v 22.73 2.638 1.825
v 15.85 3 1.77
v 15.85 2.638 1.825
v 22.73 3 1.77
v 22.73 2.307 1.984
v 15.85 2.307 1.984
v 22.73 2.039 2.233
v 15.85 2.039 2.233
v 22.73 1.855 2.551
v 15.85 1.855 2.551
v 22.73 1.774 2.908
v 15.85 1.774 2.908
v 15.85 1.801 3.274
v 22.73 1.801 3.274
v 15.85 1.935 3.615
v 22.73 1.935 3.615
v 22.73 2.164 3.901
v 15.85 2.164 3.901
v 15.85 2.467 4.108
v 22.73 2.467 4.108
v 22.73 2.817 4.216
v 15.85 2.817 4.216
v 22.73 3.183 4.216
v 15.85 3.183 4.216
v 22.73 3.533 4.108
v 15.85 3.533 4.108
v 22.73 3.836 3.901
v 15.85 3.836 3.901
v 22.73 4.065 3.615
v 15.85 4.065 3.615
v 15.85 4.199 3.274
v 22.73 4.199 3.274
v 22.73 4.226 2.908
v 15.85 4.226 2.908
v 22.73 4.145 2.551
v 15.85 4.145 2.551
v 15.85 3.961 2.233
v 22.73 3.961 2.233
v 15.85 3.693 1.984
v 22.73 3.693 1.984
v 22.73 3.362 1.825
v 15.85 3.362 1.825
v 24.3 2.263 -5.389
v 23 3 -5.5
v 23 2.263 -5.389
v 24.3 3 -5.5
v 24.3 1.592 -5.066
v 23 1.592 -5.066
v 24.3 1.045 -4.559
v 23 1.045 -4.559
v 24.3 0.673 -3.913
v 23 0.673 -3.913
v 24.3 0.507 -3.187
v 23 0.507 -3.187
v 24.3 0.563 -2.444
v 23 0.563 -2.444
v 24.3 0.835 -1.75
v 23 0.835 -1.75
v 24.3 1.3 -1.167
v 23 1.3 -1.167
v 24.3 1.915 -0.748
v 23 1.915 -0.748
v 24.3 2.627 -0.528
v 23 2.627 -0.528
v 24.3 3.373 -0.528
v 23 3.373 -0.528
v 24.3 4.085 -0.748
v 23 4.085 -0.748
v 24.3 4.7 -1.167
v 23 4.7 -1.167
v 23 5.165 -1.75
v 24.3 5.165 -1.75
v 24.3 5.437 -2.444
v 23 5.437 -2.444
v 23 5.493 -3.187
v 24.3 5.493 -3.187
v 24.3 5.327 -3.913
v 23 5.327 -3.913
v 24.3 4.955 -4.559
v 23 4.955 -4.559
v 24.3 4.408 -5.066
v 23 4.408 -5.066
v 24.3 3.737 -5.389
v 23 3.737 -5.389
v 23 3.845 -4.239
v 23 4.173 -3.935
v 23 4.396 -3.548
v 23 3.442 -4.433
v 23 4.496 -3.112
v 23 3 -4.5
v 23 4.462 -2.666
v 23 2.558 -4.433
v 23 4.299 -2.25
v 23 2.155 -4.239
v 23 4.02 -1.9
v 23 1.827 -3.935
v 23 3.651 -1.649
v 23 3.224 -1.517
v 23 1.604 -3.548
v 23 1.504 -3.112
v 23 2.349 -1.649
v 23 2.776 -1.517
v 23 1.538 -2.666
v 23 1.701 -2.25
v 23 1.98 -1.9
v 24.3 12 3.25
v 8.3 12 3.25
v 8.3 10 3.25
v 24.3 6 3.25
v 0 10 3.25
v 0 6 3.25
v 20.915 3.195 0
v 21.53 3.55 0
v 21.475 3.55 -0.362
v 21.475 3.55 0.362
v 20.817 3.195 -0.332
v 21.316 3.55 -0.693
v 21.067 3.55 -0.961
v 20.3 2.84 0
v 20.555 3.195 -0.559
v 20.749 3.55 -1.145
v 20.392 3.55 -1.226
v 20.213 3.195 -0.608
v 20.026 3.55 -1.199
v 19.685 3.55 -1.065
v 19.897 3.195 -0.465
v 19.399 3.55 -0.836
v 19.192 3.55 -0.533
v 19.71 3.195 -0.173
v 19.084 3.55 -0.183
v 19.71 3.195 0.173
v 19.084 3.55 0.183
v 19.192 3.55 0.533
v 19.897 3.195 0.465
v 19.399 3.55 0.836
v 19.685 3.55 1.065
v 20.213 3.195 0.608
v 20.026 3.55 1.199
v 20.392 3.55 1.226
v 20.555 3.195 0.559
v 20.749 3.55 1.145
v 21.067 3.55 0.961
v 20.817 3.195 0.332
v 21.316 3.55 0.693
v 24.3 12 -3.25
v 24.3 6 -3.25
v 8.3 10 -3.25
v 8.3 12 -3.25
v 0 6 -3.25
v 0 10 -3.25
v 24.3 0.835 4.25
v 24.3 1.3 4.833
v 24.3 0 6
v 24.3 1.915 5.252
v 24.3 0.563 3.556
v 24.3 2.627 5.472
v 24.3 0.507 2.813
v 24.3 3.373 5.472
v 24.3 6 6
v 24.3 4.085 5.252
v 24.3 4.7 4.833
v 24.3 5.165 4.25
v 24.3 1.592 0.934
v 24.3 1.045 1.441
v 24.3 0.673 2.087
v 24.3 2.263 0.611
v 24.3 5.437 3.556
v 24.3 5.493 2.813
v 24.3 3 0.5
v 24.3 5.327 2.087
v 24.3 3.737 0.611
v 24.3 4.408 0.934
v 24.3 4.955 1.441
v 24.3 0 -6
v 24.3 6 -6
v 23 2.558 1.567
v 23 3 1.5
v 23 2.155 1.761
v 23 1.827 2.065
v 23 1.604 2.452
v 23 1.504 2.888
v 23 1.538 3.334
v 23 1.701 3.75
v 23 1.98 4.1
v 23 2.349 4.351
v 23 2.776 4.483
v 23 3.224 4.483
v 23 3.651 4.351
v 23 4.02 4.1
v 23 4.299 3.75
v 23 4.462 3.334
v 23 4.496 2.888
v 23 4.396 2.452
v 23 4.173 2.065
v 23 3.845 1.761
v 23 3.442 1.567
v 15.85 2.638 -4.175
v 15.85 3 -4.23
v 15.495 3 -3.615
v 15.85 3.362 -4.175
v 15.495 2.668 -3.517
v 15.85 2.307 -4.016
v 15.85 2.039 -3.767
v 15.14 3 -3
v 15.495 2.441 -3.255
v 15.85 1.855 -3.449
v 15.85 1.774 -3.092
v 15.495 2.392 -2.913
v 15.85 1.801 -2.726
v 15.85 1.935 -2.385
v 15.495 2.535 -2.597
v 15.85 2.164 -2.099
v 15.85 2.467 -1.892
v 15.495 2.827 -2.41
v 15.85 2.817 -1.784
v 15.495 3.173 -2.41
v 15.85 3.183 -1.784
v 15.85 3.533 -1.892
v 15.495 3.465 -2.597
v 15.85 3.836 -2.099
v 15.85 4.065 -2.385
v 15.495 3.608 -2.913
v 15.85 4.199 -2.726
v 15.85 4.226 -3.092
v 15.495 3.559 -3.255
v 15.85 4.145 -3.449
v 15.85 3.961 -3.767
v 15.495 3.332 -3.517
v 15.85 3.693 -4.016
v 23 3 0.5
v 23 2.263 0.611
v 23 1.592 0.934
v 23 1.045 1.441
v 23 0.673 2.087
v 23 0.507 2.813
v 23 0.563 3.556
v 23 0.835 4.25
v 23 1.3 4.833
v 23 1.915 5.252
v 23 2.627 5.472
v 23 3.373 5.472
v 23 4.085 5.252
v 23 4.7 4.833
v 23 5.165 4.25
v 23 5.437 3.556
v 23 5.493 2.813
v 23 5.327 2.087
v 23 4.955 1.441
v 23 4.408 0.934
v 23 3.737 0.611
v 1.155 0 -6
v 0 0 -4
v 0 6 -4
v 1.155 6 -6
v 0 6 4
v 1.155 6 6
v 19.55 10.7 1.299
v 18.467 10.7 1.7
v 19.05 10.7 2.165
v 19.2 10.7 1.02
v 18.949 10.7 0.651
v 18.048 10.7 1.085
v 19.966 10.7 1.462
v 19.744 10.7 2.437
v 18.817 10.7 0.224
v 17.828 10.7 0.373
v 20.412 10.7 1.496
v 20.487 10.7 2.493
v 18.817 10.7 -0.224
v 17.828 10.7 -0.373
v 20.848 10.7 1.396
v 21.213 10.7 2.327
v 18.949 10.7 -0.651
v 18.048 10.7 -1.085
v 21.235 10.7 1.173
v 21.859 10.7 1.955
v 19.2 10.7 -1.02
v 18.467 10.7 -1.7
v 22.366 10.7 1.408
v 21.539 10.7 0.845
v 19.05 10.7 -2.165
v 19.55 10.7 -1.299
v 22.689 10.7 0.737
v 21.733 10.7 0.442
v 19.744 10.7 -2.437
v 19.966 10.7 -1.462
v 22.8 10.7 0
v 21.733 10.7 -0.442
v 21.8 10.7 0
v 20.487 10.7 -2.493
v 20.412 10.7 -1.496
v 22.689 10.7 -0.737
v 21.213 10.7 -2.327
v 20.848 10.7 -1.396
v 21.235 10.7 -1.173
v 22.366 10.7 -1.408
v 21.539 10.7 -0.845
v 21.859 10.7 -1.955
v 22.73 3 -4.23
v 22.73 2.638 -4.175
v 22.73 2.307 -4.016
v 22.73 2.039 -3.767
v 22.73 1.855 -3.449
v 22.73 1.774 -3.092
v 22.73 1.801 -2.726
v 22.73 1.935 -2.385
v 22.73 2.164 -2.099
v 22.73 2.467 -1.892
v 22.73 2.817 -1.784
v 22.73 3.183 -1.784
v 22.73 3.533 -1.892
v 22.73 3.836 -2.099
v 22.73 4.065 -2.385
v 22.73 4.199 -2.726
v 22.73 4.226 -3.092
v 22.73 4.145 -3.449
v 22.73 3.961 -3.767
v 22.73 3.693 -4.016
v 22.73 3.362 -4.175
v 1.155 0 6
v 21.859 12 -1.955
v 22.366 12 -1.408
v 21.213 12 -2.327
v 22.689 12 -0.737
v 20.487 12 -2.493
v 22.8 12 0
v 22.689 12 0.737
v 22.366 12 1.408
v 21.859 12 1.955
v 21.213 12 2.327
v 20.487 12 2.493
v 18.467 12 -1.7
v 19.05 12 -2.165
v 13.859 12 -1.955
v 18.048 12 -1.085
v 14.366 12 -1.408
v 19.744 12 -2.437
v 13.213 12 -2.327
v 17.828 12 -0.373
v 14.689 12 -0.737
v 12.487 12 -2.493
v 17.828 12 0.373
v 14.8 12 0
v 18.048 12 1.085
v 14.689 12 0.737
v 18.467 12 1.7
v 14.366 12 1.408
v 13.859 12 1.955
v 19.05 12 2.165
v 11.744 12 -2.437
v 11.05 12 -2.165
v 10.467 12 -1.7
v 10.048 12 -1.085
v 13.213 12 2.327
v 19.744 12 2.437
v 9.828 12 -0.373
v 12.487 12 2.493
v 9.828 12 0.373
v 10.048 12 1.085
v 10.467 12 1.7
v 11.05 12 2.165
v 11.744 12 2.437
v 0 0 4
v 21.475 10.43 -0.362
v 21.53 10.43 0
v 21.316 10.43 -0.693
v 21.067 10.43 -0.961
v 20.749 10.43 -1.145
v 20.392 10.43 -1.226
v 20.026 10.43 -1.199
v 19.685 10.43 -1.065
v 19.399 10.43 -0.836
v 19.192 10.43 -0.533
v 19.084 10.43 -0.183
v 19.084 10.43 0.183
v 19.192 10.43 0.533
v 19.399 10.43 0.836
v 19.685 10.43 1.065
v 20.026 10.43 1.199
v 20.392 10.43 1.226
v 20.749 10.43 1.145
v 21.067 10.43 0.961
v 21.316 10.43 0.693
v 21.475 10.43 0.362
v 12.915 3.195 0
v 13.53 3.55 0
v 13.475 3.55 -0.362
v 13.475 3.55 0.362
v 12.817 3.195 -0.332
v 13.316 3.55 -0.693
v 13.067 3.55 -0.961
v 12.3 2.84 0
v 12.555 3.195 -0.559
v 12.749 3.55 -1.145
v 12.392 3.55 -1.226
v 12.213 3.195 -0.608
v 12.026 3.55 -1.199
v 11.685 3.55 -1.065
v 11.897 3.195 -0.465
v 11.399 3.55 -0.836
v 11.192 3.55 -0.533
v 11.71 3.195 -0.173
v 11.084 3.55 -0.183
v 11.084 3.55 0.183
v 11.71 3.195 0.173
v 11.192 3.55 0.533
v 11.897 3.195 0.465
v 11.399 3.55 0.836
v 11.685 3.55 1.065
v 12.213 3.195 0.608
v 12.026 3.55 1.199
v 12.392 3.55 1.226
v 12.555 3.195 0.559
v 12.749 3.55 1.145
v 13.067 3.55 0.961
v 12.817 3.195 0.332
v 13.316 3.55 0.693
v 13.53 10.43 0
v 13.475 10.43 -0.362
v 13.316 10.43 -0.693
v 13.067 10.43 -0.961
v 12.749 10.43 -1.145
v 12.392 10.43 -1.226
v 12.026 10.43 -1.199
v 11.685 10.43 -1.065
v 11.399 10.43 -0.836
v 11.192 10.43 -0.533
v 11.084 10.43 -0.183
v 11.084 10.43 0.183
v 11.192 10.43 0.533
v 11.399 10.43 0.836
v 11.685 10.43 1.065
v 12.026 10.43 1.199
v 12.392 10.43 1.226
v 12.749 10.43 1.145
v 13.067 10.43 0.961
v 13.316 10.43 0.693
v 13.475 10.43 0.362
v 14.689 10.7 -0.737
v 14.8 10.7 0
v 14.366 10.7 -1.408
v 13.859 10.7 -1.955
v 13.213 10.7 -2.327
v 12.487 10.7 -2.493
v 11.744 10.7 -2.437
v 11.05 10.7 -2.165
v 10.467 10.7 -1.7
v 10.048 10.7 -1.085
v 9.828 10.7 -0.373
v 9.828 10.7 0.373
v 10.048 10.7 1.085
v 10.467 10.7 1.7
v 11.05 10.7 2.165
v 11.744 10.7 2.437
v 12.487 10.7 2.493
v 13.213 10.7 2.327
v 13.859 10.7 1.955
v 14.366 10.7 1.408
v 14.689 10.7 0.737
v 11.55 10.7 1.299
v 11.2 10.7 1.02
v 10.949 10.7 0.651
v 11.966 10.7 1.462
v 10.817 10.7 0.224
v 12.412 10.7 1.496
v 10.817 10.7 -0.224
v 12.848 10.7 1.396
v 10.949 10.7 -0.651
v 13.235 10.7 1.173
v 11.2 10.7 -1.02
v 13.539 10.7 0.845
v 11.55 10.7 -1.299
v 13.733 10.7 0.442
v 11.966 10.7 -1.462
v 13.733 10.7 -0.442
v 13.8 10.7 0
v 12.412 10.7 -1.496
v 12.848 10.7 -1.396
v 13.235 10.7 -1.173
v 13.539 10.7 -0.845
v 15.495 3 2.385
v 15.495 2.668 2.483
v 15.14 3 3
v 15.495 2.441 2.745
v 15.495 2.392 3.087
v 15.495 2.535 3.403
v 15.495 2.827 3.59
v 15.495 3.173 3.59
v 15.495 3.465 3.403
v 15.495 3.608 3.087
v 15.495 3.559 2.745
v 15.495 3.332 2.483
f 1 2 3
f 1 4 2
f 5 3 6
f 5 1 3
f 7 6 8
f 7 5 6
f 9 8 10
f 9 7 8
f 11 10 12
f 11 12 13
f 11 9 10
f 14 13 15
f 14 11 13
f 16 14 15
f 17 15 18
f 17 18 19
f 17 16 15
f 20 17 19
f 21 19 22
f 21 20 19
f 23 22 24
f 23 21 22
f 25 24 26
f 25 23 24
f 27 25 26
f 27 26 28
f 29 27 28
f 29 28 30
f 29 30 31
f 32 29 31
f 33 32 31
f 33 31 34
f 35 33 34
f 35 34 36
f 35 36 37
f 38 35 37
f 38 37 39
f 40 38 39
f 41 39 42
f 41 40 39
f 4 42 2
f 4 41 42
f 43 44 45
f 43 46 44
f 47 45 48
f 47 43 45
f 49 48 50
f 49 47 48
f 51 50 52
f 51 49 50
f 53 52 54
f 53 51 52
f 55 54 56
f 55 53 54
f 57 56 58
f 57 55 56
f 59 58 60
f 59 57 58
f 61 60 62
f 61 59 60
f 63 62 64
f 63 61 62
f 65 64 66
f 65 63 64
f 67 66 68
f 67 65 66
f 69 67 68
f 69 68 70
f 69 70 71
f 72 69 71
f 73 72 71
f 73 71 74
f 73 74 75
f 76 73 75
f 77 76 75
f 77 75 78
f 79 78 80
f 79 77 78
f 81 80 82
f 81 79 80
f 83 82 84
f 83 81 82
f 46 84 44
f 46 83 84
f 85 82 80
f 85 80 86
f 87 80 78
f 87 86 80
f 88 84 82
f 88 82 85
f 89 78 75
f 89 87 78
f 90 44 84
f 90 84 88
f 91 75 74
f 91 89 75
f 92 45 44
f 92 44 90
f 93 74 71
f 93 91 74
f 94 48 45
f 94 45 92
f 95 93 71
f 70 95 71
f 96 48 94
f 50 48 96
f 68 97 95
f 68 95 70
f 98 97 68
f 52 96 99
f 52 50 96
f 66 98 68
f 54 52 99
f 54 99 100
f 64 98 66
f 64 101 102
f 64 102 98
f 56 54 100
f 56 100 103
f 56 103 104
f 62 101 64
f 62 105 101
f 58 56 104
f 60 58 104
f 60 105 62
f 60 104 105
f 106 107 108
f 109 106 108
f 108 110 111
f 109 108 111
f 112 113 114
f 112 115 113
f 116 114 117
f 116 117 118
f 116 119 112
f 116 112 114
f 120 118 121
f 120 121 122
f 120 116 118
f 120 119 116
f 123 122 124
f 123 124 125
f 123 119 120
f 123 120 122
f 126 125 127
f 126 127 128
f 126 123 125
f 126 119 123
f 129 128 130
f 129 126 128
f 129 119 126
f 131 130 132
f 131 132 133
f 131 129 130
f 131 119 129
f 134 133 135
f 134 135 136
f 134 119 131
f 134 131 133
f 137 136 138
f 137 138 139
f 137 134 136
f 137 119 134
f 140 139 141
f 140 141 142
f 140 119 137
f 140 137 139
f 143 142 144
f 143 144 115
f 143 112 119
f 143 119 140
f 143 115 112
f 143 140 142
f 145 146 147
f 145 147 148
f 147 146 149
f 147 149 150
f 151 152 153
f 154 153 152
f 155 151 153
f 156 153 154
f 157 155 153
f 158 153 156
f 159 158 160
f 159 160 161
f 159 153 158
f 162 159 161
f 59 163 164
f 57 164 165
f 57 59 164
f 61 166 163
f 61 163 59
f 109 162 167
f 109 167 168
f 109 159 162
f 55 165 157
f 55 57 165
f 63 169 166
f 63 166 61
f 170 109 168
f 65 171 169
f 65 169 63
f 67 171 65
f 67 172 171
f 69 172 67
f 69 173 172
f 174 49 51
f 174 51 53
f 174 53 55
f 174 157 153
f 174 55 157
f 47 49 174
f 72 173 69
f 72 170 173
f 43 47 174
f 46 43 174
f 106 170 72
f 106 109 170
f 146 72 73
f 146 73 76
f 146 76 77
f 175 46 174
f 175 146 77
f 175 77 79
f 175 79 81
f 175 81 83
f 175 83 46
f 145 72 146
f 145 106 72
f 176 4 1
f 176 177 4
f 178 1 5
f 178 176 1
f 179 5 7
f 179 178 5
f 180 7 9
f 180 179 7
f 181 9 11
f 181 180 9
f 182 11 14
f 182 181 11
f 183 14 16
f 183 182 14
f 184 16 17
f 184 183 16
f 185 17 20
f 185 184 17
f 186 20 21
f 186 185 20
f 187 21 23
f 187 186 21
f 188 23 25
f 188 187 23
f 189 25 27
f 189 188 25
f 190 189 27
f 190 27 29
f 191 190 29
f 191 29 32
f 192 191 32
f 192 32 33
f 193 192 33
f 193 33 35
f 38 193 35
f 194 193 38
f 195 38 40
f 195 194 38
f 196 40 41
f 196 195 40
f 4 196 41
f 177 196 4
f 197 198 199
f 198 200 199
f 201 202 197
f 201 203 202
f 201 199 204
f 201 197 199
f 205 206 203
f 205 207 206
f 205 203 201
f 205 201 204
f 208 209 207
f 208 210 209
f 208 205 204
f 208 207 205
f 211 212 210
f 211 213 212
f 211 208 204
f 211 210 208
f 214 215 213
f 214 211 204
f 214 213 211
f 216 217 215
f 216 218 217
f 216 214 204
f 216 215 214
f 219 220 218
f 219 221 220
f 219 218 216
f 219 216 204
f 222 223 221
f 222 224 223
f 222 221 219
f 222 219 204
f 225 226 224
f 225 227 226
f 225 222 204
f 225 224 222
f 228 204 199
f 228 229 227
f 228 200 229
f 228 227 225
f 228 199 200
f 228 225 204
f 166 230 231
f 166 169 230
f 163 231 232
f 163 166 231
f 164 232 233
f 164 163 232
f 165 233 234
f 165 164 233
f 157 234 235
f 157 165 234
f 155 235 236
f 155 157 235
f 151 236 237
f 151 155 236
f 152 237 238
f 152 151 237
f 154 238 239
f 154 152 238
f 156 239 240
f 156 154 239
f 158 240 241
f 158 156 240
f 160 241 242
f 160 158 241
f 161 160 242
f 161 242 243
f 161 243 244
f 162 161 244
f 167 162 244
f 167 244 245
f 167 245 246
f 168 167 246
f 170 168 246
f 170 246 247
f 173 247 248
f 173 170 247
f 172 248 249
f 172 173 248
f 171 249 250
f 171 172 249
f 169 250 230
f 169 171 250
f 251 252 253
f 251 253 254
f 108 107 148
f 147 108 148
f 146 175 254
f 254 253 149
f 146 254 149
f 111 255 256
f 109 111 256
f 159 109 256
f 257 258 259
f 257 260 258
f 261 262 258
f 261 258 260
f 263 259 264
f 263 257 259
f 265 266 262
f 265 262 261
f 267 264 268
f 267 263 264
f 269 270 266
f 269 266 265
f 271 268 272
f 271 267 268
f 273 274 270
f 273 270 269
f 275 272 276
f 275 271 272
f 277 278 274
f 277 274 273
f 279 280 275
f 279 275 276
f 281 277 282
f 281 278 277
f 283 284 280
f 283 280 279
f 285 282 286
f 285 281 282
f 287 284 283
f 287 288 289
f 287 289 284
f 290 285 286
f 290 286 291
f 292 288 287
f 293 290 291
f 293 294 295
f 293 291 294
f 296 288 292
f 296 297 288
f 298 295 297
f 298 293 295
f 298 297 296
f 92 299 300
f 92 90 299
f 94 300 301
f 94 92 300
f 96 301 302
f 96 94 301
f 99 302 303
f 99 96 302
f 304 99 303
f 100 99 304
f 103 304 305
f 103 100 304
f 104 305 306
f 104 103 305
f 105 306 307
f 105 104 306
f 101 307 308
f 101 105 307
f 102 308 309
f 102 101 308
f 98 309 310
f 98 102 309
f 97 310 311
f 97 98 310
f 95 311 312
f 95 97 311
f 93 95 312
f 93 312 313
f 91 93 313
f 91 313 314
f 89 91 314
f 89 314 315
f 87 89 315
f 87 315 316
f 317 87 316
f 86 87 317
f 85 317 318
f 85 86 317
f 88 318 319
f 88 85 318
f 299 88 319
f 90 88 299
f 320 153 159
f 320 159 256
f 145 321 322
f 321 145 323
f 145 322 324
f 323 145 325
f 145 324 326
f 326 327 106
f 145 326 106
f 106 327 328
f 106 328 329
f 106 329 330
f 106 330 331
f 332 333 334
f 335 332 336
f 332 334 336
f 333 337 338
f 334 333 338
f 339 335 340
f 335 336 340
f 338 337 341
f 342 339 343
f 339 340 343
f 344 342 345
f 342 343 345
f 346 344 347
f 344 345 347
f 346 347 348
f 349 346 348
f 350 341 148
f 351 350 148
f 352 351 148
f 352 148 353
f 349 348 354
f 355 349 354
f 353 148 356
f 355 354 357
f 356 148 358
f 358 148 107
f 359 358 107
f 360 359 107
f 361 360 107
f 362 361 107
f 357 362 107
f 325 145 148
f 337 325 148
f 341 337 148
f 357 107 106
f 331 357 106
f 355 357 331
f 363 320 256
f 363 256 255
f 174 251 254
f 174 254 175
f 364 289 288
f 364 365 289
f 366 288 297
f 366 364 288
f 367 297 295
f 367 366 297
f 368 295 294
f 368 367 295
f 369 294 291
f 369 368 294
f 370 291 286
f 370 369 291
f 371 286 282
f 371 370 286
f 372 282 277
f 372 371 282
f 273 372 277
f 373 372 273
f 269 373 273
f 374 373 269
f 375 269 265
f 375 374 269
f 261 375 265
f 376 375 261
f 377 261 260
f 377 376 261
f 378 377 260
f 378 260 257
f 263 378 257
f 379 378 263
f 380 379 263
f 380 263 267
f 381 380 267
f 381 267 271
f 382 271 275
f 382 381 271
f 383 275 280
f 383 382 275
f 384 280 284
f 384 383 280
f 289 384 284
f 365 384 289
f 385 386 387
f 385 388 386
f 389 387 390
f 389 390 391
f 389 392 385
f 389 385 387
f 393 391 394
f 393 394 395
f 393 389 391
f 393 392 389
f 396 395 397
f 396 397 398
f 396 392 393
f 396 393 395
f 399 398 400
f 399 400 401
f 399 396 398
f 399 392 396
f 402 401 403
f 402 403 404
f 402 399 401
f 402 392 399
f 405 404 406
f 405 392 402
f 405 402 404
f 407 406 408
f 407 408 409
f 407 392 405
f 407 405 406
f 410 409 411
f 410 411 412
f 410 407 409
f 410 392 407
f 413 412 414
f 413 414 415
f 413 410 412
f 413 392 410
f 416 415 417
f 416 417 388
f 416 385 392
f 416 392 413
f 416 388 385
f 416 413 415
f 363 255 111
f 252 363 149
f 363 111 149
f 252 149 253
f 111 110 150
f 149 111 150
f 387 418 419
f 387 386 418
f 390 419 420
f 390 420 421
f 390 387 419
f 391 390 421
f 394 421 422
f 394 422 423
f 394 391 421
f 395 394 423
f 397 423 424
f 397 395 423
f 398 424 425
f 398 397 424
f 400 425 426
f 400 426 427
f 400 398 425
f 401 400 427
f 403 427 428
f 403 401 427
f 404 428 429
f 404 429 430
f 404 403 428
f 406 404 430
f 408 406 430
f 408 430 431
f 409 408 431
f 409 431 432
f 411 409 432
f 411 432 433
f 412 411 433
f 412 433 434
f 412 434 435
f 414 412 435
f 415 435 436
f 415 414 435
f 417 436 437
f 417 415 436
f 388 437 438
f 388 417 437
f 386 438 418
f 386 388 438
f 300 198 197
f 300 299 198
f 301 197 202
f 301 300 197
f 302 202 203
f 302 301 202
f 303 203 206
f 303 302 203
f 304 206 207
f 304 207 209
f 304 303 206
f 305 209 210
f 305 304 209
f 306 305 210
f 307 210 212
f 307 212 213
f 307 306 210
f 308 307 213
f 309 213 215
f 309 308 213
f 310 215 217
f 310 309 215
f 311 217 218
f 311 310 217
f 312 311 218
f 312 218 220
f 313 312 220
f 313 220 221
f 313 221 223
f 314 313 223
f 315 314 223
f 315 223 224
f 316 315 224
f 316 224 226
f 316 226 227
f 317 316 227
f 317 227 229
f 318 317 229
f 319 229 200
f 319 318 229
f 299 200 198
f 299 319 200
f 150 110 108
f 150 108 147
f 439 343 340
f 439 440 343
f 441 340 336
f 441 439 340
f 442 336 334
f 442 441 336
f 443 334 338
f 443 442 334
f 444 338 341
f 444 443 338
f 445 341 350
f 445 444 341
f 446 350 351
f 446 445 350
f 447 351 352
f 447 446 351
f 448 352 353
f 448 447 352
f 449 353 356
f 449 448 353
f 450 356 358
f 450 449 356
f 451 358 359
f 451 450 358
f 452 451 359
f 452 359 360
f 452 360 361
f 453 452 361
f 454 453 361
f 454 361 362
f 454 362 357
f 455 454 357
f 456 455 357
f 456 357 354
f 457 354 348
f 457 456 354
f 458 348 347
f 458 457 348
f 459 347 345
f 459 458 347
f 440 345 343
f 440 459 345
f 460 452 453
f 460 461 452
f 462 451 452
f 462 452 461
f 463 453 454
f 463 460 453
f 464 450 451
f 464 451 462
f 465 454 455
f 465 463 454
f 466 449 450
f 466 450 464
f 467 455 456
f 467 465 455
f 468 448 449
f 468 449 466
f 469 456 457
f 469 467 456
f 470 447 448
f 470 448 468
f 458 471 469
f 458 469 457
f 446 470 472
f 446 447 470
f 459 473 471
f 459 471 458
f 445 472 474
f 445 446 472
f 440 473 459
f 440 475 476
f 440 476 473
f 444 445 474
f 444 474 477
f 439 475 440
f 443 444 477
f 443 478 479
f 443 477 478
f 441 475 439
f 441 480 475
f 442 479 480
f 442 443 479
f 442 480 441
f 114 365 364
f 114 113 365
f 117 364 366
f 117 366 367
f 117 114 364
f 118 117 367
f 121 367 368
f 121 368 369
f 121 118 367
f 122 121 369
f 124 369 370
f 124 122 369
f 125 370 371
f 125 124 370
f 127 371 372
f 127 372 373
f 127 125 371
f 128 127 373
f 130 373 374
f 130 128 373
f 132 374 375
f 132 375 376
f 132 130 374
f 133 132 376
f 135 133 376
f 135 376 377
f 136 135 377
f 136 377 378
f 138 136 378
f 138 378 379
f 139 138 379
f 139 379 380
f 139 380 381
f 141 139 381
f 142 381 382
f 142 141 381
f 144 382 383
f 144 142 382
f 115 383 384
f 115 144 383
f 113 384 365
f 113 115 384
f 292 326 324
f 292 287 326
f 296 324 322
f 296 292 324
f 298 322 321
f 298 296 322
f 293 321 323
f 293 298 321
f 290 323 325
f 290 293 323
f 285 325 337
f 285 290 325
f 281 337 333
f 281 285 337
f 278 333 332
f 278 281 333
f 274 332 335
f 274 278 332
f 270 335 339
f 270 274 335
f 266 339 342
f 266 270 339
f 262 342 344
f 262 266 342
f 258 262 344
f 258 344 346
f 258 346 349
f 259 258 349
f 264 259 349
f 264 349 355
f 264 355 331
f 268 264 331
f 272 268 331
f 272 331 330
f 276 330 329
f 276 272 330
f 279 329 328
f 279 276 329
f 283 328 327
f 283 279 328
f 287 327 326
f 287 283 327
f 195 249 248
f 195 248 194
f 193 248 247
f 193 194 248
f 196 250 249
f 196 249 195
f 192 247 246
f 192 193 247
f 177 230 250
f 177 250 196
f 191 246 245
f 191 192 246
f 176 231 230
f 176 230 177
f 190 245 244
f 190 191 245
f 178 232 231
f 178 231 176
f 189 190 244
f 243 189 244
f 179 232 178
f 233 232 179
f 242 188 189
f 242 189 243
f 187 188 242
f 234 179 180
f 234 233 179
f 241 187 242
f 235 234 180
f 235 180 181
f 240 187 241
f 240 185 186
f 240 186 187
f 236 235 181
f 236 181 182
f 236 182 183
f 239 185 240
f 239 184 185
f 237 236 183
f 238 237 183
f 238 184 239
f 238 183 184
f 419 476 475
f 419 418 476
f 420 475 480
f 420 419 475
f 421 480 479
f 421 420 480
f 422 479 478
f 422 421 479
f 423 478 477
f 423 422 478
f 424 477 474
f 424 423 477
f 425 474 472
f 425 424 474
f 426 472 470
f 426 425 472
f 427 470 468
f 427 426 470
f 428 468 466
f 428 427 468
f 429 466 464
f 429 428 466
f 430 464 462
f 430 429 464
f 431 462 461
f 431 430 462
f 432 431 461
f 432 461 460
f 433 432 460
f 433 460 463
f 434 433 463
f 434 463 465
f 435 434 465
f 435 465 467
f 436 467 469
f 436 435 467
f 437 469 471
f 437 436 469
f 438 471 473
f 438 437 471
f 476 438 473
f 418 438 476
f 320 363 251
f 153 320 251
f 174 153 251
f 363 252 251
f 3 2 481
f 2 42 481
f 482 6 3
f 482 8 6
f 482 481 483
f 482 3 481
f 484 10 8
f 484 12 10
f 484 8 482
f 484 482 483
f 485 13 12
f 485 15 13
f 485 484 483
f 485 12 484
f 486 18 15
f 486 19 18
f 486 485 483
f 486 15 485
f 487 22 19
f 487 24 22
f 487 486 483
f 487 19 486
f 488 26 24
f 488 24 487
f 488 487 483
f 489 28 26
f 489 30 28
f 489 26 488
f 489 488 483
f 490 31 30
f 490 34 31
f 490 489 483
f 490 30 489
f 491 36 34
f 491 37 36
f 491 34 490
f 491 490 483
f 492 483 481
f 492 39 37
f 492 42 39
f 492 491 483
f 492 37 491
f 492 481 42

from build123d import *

# Parameters (mm, degrees)
BOSS_EXTRUDE1_DEPTH = 24.3
SKETCH2_W           = 12
SKETCH2_H           = 2
CUT_EXTRUDE1_DEPTH  = 8.3
CUT_EXTRUDE2_DEPTH  = 6


with BuildPart() as part:
    # Sketch1 → Boss-Extrude1 (new body)
    with BuildSketch(Plane(origin=(0, 0, 0), x_dir=(0, 0, -1), z_dir=(1, 0, 0))):
        Polygon((-6, 6), (-6, 0), (6, 0), (6, 6), (3.25, 6), (3.25, 12), (-3.25, 12), (-3.25, 6), align=None)
    extrude(amount=BOSS_EXTRUDE1_DEPTH)

    # Sketch2 → Cut-Extrude1 (cut)
    with BuildSketch(Plane(origin=(0, 0, 0), x_dir=(0, 0, -1), z_dir=(1, 0, 0))):
        with Locations((0, 11)):
            Rectangle(SKETCH2_W, SKETCH2_H)
    extrude(amount=CUT_EXTRUDE1_DEPTH, mode=Mode.SUBTRACT)

    # Sketch3 → Cut-Revolve1 (revolve, cut)
    with BuildSketch(Plane(origin=(0, 3, 0), x_dir=(1, 0, 0), z_dir=(0, 1, 0))):
        Polygon((15.140147844, 3), (15.85, 4.2295), (22.7295, 4.2295), (23, 4.5), (23, 5.5), (24.3, 5.5), (24.3, 3), align=None)
    revolve(axis=Axis((24.3, 3, -3), (-1, 0, 0)), mode=Mode.SUBTRACT)

    # Sketch4 → Cut-Revolve2 (revolve, cut)
    with BuildSketch(Plane(origin=(0, 3, 0), x_dir=(1, 0, 0), z_dir=(0, 1, 0))):
        Polygon((15.140147844, -3), (15.85, -1.7705), (22.7295, -1.7705), (23, -1.5), (23, -0.5), (24.3, -0.5), (24.3, -3), align=None)
    revolve(axis=Axis((24.3, 3, 3), (-1, 0, 0)), mode=Mode.SUBTRACT)

    # Sketch5 → Cut-Revolve3 (revolve, cut)
    with BuildSketch(Plane.XY):
        Polygon((20.3, 12), (22.8, 12), (22.8, 10.7), (21.8, 10.7), (21.5295, 10.4295), (21.5295, 3.55), (20.3, 2.840147844), align=None)
    revolve(axis=Axis((20.3, 2.840147844, 0), (0, 1, 0)), mode=Mode.SUBTRACT)

    # Sketch6 → Cut-Revolve4 (revolve, cut)
    with BuildSketch(Plane.XY):
        Polygon((12.3, 12), (14.8, 12), (14.8, 10.7), (13.8, 10.7), (13.5295, 10.4295), (13.5295, 3.55), (12.3, 2.840147844), align=None)
    revolve(axis=Axis((12.3, 2.840147844, 0), (0, 1, 0)), mode=Mode.SUBTRACT)

    # Sketch7 → Cut-Extrude2 (cut)
    with BuildSketch(Plane(origin=(0, 0, 0), x_dir=(1, 0, 0), z_dir=(0, 1, 0))):
        Polygon((-1, -7), (11.15, -7), (11.15, -6), (1.154700538, -6), (0, -4), (0, 4), (1.154700538, 6), (11.15, 6), (11.15, 7), (-1, 7), align=None)
    extrude(amount=CUT_EXTRUDE2_DEPTH, mode=Mode.SUBTRACT)


solid = part.part
